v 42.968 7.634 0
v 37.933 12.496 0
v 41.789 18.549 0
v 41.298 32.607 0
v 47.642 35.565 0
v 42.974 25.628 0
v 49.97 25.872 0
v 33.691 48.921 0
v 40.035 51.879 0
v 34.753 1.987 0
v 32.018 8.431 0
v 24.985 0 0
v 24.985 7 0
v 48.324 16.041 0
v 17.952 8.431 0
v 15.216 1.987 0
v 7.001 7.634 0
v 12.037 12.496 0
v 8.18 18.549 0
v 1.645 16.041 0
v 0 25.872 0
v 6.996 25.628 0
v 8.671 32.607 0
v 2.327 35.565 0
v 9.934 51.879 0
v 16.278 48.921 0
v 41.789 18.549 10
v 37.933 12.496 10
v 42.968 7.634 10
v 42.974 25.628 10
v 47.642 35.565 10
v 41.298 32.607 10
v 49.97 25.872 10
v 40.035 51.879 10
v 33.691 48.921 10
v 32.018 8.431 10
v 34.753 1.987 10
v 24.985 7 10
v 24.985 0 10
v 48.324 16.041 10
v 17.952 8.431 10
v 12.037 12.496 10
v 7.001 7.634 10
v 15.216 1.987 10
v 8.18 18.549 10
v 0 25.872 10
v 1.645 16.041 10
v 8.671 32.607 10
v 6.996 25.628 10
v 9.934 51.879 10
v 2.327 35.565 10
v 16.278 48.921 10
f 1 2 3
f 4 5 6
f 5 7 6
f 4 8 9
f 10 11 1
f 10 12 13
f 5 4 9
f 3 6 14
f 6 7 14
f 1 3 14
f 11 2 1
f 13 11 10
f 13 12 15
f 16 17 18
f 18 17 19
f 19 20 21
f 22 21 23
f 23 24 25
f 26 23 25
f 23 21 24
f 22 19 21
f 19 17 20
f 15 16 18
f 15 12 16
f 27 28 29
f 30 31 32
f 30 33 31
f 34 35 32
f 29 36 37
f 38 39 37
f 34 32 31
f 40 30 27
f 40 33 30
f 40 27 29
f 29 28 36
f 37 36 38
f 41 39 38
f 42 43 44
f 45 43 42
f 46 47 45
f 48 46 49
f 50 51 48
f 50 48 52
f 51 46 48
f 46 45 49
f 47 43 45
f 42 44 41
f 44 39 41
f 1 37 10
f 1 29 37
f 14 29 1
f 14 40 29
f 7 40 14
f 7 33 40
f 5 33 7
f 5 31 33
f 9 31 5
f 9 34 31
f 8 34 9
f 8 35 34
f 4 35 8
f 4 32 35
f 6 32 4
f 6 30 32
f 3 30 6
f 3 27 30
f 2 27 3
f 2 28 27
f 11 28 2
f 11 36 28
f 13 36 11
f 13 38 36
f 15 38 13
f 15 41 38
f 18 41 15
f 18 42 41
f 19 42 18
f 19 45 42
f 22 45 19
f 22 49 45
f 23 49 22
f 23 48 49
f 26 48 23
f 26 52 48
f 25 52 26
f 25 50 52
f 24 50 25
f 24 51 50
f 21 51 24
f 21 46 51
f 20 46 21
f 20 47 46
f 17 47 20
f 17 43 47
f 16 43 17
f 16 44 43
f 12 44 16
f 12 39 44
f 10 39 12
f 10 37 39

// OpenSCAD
$fn = 32;

// ----------------------------------------------------------------------
// Clip blank: omega clip, 10 mm thick
// ----------------------------------------------------------------------

// --- parameters (mm) ---
profile_height = 10;      // extrusion height
profile_points = 26;      // points of the closed outline

profile = [[2.327, 35.565], [0, 25.872], [1.645, 16.041], [7.001, 7.634], [15.216, 1.987], [24.985, 0], [34.753, 1.987], [42.968, 7.634], [48.324, 16.041], [49.97, 25.872], [47.642, 35.565], [40.035, 51.879], [33.691, 48.921], [41.298, 32.607], [42.974, 25.628], [41.789, 18.549], [37.933, 12.496], [32.018, 8.431], [24.985, 7], [17.952, 8.431], [12.037, 12.496], [8.18, 18.549], [6.996, 25.628], [8.671, 32.607], [16.278, 48.921], [9.934, 51.879]];  // single closed polygon, 26 points, counter clockwise

// --- the one profile operation ---
linear_extrude(height = profile_height) polygon(points = profile);
